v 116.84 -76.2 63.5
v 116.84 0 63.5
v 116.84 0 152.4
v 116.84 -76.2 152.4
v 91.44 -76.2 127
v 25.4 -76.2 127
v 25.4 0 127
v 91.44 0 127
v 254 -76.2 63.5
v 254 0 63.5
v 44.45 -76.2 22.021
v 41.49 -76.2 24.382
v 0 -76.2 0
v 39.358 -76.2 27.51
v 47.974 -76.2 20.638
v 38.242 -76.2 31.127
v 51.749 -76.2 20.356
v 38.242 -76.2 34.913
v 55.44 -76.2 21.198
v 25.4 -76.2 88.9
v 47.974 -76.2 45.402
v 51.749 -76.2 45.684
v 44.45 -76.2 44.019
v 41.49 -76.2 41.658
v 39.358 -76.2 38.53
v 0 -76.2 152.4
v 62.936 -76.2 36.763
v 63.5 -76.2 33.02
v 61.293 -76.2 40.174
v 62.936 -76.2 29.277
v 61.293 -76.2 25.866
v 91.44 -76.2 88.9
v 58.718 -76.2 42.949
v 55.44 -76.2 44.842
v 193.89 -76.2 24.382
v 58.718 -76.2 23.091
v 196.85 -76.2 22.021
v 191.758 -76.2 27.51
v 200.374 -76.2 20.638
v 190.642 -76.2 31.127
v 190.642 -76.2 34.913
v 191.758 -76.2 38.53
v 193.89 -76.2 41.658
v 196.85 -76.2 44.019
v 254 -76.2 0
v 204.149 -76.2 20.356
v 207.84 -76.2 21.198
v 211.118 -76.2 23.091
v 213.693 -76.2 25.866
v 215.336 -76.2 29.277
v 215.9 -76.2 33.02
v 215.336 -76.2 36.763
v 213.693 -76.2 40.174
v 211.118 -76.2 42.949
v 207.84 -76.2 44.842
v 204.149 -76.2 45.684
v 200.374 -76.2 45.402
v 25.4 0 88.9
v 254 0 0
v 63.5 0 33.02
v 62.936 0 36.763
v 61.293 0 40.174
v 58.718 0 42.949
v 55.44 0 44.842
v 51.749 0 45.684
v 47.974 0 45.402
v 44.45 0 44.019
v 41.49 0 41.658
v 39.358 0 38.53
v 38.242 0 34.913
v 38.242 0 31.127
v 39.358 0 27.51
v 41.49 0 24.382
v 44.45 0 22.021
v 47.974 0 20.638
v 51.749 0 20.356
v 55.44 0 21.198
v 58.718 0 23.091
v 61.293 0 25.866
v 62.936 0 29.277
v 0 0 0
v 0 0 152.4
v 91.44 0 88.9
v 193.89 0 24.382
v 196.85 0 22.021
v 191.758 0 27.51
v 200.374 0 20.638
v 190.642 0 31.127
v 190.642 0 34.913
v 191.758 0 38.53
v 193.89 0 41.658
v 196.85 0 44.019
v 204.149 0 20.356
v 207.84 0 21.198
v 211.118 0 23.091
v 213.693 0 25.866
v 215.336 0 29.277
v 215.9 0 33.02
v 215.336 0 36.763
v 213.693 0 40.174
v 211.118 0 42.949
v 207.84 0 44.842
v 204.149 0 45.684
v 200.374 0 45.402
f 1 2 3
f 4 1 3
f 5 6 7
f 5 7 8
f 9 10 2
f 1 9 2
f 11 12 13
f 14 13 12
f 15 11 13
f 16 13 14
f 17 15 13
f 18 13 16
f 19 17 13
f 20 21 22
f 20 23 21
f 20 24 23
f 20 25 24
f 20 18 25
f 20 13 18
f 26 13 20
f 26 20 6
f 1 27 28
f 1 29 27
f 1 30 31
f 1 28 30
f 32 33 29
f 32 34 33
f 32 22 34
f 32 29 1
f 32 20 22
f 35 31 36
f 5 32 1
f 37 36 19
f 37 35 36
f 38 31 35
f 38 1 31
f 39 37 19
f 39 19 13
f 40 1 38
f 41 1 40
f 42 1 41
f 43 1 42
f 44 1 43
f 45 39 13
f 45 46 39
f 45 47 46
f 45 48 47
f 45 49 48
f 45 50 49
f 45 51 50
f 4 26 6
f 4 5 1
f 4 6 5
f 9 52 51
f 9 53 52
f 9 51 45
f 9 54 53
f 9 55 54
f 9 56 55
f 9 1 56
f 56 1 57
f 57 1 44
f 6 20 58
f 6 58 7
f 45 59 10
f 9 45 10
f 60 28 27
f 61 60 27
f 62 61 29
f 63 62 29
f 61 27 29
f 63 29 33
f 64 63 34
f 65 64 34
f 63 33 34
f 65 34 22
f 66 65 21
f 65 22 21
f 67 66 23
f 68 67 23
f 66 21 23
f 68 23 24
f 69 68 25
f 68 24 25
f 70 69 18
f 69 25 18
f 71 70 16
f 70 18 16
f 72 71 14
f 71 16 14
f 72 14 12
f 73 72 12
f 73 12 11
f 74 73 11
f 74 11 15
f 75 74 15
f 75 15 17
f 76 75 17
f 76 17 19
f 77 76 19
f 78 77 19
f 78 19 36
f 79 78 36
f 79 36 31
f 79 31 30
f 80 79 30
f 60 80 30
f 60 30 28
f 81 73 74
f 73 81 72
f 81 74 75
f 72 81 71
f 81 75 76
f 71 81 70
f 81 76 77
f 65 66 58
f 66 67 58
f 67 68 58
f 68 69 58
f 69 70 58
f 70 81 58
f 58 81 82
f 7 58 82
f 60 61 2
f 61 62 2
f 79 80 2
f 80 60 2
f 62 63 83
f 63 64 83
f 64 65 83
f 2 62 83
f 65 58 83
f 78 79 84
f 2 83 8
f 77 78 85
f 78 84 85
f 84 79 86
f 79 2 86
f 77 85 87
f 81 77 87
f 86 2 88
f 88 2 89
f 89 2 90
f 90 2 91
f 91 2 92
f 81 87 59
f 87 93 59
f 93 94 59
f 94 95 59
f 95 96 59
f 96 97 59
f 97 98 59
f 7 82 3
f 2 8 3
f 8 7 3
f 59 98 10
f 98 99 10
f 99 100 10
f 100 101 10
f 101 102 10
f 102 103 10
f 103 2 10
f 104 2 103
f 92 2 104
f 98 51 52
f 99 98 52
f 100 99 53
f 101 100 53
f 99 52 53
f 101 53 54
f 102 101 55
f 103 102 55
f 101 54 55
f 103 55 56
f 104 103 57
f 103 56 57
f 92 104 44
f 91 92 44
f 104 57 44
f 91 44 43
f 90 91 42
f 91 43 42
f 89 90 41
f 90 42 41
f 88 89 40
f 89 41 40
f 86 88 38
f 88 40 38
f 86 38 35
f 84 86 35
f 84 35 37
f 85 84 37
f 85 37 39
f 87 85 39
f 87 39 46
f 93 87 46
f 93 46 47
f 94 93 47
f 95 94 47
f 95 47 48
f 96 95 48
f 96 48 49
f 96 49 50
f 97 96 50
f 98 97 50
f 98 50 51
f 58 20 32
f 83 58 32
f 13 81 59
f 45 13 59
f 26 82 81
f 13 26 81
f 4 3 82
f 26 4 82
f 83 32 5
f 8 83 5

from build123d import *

# Parameters (mm, degrees)
F1_DEPTH = 76.2
F2_W     = 66.04
F2_H     = 38.1
F3_DEPTH = 787.4
F4_R     = 12.7
F5_DEPTH = 78.74


with BuildPart() as f1:
    # F0 (on Front) → F1 (new body)
    with BuildSketch(Plane.XZ):
        Polygon((116.84, 152.4), (0, 152.4), (0, 0), (254, 0), (254, 63.5), (116.84, 63.5), align=None)
    extrude(amount=F1_DEPTH)

    # F2 (on face) → F3 (cut)
    with BuildSketch(Plane.XZ.offset(76.2)):
        with Locations((58.42, 107.95)):
            Rectangle(F2_W, F2_H)
    extrude(amount=-F3_DEPTH, mode=Mode.SUBTRACT)

    # F4 (on face) → F5 (cut)
    with BuildSketch(Plane.XZ.offset(76.2)):
        with Locations((50.8, 33.02)):
            Circle(F4_R)
        with Locations((203.2, 33.02)):
            Circle(F4_R)
    extrude(amount=-F5_DEPTH, mode=Mode.SUBTRACT)


solid = f1.part
